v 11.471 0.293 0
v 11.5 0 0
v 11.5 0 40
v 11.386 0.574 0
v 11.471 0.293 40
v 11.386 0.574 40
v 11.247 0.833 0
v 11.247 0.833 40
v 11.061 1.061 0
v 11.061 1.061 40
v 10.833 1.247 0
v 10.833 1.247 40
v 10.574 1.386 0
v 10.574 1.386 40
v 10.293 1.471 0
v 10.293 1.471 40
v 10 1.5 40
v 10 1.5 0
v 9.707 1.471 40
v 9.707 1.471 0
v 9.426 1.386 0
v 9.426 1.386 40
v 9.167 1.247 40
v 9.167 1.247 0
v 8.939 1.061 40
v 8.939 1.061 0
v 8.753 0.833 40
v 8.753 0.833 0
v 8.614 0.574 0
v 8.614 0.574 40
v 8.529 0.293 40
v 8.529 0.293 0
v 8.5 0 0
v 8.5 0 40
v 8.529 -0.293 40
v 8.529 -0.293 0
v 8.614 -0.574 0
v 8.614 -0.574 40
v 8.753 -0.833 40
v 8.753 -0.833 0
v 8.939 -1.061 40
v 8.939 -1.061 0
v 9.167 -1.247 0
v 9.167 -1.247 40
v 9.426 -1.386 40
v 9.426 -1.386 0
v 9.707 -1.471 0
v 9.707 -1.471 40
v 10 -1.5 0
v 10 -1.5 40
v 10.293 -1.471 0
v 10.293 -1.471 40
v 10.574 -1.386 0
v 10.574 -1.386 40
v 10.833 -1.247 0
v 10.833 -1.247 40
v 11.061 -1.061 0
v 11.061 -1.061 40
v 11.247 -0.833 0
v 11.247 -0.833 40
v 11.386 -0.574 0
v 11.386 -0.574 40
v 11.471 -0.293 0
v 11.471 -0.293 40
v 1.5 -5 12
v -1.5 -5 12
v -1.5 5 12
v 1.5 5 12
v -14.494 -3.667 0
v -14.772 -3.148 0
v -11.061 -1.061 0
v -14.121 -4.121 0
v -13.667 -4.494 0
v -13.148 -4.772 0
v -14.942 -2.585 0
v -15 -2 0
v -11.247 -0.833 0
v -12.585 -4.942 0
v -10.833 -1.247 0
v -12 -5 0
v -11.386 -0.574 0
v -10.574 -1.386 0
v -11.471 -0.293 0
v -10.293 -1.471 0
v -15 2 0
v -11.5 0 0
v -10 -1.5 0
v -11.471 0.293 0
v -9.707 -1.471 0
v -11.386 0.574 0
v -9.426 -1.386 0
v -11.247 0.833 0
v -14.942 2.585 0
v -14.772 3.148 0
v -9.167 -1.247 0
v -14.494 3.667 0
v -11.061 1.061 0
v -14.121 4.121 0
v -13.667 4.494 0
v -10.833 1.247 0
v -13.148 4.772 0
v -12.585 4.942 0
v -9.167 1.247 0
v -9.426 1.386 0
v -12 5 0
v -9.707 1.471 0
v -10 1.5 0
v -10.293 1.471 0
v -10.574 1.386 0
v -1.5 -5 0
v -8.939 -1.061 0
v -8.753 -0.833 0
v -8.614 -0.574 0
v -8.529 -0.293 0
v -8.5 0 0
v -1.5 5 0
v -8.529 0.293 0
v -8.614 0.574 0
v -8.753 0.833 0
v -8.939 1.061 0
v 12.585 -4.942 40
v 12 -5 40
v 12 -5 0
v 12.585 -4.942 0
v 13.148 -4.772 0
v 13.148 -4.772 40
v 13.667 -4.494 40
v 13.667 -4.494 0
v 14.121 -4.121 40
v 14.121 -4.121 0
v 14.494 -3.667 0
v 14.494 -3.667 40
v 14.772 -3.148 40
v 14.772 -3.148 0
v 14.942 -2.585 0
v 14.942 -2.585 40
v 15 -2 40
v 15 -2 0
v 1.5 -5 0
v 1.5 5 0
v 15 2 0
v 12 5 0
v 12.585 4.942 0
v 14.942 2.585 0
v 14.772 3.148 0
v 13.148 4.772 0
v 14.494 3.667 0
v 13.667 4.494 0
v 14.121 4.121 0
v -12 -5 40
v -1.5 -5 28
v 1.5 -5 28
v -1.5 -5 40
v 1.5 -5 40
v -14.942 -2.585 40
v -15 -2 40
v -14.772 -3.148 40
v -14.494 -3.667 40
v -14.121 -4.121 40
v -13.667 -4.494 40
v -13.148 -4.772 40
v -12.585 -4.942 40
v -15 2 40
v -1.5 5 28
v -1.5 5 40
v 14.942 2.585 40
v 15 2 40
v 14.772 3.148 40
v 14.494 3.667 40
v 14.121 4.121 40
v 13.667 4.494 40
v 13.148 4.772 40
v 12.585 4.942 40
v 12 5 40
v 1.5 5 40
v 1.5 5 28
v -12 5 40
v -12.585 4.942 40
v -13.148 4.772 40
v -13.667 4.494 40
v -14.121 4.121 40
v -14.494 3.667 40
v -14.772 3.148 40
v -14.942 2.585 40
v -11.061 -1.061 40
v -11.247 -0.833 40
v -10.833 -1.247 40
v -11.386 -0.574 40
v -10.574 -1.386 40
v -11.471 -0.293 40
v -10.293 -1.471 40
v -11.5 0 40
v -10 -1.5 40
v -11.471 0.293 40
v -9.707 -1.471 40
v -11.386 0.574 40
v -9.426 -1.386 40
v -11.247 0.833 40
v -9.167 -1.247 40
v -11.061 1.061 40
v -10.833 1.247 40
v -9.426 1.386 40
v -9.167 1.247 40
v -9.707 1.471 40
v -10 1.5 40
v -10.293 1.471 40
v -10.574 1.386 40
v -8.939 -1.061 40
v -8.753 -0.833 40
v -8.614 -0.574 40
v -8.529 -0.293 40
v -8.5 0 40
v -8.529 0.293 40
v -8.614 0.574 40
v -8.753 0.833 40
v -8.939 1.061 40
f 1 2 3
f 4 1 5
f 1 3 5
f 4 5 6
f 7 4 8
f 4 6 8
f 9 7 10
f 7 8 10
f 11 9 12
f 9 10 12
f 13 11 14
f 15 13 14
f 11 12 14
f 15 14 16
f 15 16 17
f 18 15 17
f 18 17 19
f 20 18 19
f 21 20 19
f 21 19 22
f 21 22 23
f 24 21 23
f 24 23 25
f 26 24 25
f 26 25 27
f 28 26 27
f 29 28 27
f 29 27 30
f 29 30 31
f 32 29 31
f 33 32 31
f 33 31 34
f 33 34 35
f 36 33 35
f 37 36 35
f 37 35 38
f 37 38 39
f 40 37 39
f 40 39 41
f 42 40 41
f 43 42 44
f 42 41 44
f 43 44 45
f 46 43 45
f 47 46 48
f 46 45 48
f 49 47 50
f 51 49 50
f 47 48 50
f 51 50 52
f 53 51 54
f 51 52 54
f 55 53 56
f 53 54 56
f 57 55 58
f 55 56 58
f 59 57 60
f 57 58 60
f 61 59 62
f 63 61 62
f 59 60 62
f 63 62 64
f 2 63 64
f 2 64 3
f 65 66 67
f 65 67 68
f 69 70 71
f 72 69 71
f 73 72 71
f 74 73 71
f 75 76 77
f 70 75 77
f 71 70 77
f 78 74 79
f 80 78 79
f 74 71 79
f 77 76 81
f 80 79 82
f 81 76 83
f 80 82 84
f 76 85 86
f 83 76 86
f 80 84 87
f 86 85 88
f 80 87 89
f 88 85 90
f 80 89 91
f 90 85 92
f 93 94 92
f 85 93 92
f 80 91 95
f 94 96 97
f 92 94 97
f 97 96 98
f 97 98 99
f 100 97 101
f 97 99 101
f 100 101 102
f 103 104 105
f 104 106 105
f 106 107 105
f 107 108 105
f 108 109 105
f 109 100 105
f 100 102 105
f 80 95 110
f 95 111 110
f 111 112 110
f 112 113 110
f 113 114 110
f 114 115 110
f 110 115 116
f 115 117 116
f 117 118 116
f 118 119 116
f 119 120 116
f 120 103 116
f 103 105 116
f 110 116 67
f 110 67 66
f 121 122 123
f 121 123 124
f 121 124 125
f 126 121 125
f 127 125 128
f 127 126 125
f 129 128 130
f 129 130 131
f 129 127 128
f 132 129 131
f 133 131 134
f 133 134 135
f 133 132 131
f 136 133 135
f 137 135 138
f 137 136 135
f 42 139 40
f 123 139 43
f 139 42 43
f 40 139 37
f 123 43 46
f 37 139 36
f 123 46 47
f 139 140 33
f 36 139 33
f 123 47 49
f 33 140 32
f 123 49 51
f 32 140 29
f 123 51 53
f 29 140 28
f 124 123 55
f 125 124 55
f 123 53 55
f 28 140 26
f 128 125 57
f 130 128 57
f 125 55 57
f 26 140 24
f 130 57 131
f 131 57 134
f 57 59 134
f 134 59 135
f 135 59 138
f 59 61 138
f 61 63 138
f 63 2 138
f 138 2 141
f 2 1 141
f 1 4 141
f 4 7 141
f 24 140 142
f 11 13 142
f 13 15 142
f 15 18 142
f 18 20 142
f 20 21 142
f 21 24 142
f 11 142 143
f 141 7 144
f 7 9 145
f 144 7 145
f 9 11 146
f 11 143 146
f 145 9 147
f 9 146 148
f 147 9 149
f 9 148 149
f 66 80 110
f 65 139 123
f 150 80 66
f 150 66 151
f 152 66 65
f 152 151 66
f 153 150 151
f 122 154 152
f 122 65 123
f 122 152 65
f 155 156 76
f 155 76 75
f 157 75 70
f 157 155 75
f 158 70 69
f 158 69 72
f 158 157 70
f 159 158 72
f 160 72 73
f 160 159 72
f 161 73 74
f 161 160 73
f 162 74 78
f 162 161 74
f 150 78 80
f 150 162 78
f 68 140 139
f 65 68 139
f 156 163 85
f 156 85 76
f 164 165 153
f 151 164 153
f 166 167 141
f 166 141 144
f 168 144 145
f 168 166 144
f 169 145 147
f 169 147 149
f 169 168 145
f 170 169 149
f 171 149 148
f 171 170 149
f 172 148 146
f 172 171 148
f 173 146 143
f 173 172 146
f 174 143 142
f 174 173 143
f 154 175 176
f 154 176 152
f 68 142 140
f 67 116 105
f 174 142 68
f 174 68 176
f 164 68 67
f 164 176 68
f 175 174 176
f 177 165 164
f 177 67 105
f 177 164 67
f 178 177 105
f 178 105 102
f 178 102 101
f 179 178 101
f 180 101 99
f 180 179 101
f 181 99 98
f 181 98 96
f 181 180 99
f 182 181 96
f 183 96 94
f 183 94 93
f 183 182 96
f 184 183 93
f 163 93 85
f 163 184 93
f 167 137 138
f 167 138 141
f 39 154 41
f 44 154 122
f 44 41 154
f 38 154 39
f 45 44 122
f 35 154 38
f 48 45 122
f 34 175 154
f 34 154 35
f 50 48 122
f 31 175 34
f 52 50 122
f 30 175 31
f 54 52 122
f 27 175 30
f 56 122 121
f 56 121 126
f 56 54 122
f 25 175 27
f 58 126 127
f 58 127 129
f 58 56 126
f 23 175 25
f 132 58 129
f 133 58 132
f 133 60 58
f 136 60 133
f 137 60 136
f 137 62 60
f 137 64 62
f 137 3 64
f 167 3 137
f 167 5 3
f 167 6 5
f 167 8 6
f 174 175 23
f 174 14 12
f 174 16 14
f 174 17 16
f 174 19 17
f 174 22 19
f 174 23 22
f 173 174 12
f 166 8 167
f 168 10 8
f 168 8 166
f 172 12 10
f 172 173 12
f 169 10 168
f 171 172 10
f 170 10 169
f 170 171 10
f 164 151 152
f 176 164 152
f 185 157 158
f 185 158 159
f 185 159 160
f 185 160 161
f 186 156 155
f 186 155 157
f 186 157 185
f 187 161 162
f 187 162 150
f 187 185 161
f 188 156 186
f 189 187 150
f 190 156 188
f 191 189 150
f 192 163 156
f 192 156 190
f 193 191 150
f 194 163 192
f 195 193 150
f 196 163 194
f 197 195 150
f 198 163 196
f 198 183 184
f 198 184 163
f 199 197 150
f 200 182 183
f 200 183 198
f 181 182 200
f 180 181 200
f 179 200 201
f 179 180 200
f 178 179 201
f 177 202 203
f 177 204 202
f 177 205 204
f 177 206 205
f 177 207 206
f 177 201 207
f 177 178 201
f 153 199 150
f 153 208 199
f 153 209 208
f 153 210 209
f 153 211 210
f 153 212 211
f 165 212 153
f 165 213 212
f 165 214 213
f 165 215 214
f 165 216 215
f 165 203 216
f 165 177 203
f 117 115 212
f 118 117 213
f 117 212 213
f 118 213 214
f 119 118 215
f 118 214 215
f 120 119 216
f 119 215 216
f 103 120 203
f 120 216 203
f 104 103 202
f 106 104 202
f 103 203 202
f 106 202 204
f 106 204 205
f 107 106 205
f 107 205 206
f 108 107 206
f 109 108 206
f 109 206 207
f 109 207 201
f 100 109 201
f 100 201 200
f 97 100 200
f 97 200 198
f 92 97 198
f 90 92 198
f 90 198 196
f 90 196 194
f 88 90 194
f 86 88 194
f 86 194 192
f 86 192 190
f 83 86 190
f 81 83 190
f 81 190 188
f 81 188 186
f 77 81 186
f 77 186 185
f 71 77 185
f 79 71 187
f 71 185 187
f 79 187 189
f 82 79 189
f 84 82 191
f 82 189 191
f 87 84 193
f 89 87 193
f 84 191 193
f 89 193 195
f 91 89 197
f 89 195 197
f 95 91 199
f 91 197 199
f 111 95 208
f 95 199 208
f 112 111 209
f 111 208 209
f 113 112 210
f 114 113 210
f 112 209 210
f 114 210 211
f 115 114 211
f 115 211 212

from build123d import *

# Parameters (mm, degrees)
F0_R     = 1.5
F1_DEPTH = 20
F2_W     = 3
F2_H     = 10
F3_DEPTH = 12


with BuildPart() as f1:
    # F0 (on Top) → F1 (new body)
    with BuildSketch(Plane.XY):
        with BuildLine():
            ThreePointArc((15, 2), (14.12132, 4.12132), (12, 5))
            Line((12, 5), (-12, 5))
            ThreePointArc((-12, 5), (-14.12132, 4.12132), (-15, 2))
            Line((-15, 2), (-15, -2))
            ThreePointArc((-15, -2), (-14.12132, -4.12132), (-12, -5))
            Line((-12, -5), (12, -5))
            ThreePointArc((12, -5), (14.12132, -4.12132), (15, -2))
            Line((15, -2), (15, 2))
        make_face()
        with Locations((-10, 0)):
            Circle(F0_R, mode=Mode.SUBTRACT)
        with Locations((10, 0)):
            Circle(F0_R, mode=Mode.SUBTRACT)
    extrude(amount=F1_DEPTH)

    # F2 (on face) → F3 (cut)
    with BuildSketch(Plane(origin=(0, 0, 0), x_dir=(1, 0, 0), z_dir=(0, 0, -1))):
        Rectangle(F2_W, F2_H)
    extrude(amount=-F3_DEPTH, mode=Mode.SUBTRACT)

    # F4: F1 across face


with BuildPart() as f1_1:
    add(f1.part)
    add(f1.part.mirror(Plane.XY.offset(20)))


solid = f1_1.part
